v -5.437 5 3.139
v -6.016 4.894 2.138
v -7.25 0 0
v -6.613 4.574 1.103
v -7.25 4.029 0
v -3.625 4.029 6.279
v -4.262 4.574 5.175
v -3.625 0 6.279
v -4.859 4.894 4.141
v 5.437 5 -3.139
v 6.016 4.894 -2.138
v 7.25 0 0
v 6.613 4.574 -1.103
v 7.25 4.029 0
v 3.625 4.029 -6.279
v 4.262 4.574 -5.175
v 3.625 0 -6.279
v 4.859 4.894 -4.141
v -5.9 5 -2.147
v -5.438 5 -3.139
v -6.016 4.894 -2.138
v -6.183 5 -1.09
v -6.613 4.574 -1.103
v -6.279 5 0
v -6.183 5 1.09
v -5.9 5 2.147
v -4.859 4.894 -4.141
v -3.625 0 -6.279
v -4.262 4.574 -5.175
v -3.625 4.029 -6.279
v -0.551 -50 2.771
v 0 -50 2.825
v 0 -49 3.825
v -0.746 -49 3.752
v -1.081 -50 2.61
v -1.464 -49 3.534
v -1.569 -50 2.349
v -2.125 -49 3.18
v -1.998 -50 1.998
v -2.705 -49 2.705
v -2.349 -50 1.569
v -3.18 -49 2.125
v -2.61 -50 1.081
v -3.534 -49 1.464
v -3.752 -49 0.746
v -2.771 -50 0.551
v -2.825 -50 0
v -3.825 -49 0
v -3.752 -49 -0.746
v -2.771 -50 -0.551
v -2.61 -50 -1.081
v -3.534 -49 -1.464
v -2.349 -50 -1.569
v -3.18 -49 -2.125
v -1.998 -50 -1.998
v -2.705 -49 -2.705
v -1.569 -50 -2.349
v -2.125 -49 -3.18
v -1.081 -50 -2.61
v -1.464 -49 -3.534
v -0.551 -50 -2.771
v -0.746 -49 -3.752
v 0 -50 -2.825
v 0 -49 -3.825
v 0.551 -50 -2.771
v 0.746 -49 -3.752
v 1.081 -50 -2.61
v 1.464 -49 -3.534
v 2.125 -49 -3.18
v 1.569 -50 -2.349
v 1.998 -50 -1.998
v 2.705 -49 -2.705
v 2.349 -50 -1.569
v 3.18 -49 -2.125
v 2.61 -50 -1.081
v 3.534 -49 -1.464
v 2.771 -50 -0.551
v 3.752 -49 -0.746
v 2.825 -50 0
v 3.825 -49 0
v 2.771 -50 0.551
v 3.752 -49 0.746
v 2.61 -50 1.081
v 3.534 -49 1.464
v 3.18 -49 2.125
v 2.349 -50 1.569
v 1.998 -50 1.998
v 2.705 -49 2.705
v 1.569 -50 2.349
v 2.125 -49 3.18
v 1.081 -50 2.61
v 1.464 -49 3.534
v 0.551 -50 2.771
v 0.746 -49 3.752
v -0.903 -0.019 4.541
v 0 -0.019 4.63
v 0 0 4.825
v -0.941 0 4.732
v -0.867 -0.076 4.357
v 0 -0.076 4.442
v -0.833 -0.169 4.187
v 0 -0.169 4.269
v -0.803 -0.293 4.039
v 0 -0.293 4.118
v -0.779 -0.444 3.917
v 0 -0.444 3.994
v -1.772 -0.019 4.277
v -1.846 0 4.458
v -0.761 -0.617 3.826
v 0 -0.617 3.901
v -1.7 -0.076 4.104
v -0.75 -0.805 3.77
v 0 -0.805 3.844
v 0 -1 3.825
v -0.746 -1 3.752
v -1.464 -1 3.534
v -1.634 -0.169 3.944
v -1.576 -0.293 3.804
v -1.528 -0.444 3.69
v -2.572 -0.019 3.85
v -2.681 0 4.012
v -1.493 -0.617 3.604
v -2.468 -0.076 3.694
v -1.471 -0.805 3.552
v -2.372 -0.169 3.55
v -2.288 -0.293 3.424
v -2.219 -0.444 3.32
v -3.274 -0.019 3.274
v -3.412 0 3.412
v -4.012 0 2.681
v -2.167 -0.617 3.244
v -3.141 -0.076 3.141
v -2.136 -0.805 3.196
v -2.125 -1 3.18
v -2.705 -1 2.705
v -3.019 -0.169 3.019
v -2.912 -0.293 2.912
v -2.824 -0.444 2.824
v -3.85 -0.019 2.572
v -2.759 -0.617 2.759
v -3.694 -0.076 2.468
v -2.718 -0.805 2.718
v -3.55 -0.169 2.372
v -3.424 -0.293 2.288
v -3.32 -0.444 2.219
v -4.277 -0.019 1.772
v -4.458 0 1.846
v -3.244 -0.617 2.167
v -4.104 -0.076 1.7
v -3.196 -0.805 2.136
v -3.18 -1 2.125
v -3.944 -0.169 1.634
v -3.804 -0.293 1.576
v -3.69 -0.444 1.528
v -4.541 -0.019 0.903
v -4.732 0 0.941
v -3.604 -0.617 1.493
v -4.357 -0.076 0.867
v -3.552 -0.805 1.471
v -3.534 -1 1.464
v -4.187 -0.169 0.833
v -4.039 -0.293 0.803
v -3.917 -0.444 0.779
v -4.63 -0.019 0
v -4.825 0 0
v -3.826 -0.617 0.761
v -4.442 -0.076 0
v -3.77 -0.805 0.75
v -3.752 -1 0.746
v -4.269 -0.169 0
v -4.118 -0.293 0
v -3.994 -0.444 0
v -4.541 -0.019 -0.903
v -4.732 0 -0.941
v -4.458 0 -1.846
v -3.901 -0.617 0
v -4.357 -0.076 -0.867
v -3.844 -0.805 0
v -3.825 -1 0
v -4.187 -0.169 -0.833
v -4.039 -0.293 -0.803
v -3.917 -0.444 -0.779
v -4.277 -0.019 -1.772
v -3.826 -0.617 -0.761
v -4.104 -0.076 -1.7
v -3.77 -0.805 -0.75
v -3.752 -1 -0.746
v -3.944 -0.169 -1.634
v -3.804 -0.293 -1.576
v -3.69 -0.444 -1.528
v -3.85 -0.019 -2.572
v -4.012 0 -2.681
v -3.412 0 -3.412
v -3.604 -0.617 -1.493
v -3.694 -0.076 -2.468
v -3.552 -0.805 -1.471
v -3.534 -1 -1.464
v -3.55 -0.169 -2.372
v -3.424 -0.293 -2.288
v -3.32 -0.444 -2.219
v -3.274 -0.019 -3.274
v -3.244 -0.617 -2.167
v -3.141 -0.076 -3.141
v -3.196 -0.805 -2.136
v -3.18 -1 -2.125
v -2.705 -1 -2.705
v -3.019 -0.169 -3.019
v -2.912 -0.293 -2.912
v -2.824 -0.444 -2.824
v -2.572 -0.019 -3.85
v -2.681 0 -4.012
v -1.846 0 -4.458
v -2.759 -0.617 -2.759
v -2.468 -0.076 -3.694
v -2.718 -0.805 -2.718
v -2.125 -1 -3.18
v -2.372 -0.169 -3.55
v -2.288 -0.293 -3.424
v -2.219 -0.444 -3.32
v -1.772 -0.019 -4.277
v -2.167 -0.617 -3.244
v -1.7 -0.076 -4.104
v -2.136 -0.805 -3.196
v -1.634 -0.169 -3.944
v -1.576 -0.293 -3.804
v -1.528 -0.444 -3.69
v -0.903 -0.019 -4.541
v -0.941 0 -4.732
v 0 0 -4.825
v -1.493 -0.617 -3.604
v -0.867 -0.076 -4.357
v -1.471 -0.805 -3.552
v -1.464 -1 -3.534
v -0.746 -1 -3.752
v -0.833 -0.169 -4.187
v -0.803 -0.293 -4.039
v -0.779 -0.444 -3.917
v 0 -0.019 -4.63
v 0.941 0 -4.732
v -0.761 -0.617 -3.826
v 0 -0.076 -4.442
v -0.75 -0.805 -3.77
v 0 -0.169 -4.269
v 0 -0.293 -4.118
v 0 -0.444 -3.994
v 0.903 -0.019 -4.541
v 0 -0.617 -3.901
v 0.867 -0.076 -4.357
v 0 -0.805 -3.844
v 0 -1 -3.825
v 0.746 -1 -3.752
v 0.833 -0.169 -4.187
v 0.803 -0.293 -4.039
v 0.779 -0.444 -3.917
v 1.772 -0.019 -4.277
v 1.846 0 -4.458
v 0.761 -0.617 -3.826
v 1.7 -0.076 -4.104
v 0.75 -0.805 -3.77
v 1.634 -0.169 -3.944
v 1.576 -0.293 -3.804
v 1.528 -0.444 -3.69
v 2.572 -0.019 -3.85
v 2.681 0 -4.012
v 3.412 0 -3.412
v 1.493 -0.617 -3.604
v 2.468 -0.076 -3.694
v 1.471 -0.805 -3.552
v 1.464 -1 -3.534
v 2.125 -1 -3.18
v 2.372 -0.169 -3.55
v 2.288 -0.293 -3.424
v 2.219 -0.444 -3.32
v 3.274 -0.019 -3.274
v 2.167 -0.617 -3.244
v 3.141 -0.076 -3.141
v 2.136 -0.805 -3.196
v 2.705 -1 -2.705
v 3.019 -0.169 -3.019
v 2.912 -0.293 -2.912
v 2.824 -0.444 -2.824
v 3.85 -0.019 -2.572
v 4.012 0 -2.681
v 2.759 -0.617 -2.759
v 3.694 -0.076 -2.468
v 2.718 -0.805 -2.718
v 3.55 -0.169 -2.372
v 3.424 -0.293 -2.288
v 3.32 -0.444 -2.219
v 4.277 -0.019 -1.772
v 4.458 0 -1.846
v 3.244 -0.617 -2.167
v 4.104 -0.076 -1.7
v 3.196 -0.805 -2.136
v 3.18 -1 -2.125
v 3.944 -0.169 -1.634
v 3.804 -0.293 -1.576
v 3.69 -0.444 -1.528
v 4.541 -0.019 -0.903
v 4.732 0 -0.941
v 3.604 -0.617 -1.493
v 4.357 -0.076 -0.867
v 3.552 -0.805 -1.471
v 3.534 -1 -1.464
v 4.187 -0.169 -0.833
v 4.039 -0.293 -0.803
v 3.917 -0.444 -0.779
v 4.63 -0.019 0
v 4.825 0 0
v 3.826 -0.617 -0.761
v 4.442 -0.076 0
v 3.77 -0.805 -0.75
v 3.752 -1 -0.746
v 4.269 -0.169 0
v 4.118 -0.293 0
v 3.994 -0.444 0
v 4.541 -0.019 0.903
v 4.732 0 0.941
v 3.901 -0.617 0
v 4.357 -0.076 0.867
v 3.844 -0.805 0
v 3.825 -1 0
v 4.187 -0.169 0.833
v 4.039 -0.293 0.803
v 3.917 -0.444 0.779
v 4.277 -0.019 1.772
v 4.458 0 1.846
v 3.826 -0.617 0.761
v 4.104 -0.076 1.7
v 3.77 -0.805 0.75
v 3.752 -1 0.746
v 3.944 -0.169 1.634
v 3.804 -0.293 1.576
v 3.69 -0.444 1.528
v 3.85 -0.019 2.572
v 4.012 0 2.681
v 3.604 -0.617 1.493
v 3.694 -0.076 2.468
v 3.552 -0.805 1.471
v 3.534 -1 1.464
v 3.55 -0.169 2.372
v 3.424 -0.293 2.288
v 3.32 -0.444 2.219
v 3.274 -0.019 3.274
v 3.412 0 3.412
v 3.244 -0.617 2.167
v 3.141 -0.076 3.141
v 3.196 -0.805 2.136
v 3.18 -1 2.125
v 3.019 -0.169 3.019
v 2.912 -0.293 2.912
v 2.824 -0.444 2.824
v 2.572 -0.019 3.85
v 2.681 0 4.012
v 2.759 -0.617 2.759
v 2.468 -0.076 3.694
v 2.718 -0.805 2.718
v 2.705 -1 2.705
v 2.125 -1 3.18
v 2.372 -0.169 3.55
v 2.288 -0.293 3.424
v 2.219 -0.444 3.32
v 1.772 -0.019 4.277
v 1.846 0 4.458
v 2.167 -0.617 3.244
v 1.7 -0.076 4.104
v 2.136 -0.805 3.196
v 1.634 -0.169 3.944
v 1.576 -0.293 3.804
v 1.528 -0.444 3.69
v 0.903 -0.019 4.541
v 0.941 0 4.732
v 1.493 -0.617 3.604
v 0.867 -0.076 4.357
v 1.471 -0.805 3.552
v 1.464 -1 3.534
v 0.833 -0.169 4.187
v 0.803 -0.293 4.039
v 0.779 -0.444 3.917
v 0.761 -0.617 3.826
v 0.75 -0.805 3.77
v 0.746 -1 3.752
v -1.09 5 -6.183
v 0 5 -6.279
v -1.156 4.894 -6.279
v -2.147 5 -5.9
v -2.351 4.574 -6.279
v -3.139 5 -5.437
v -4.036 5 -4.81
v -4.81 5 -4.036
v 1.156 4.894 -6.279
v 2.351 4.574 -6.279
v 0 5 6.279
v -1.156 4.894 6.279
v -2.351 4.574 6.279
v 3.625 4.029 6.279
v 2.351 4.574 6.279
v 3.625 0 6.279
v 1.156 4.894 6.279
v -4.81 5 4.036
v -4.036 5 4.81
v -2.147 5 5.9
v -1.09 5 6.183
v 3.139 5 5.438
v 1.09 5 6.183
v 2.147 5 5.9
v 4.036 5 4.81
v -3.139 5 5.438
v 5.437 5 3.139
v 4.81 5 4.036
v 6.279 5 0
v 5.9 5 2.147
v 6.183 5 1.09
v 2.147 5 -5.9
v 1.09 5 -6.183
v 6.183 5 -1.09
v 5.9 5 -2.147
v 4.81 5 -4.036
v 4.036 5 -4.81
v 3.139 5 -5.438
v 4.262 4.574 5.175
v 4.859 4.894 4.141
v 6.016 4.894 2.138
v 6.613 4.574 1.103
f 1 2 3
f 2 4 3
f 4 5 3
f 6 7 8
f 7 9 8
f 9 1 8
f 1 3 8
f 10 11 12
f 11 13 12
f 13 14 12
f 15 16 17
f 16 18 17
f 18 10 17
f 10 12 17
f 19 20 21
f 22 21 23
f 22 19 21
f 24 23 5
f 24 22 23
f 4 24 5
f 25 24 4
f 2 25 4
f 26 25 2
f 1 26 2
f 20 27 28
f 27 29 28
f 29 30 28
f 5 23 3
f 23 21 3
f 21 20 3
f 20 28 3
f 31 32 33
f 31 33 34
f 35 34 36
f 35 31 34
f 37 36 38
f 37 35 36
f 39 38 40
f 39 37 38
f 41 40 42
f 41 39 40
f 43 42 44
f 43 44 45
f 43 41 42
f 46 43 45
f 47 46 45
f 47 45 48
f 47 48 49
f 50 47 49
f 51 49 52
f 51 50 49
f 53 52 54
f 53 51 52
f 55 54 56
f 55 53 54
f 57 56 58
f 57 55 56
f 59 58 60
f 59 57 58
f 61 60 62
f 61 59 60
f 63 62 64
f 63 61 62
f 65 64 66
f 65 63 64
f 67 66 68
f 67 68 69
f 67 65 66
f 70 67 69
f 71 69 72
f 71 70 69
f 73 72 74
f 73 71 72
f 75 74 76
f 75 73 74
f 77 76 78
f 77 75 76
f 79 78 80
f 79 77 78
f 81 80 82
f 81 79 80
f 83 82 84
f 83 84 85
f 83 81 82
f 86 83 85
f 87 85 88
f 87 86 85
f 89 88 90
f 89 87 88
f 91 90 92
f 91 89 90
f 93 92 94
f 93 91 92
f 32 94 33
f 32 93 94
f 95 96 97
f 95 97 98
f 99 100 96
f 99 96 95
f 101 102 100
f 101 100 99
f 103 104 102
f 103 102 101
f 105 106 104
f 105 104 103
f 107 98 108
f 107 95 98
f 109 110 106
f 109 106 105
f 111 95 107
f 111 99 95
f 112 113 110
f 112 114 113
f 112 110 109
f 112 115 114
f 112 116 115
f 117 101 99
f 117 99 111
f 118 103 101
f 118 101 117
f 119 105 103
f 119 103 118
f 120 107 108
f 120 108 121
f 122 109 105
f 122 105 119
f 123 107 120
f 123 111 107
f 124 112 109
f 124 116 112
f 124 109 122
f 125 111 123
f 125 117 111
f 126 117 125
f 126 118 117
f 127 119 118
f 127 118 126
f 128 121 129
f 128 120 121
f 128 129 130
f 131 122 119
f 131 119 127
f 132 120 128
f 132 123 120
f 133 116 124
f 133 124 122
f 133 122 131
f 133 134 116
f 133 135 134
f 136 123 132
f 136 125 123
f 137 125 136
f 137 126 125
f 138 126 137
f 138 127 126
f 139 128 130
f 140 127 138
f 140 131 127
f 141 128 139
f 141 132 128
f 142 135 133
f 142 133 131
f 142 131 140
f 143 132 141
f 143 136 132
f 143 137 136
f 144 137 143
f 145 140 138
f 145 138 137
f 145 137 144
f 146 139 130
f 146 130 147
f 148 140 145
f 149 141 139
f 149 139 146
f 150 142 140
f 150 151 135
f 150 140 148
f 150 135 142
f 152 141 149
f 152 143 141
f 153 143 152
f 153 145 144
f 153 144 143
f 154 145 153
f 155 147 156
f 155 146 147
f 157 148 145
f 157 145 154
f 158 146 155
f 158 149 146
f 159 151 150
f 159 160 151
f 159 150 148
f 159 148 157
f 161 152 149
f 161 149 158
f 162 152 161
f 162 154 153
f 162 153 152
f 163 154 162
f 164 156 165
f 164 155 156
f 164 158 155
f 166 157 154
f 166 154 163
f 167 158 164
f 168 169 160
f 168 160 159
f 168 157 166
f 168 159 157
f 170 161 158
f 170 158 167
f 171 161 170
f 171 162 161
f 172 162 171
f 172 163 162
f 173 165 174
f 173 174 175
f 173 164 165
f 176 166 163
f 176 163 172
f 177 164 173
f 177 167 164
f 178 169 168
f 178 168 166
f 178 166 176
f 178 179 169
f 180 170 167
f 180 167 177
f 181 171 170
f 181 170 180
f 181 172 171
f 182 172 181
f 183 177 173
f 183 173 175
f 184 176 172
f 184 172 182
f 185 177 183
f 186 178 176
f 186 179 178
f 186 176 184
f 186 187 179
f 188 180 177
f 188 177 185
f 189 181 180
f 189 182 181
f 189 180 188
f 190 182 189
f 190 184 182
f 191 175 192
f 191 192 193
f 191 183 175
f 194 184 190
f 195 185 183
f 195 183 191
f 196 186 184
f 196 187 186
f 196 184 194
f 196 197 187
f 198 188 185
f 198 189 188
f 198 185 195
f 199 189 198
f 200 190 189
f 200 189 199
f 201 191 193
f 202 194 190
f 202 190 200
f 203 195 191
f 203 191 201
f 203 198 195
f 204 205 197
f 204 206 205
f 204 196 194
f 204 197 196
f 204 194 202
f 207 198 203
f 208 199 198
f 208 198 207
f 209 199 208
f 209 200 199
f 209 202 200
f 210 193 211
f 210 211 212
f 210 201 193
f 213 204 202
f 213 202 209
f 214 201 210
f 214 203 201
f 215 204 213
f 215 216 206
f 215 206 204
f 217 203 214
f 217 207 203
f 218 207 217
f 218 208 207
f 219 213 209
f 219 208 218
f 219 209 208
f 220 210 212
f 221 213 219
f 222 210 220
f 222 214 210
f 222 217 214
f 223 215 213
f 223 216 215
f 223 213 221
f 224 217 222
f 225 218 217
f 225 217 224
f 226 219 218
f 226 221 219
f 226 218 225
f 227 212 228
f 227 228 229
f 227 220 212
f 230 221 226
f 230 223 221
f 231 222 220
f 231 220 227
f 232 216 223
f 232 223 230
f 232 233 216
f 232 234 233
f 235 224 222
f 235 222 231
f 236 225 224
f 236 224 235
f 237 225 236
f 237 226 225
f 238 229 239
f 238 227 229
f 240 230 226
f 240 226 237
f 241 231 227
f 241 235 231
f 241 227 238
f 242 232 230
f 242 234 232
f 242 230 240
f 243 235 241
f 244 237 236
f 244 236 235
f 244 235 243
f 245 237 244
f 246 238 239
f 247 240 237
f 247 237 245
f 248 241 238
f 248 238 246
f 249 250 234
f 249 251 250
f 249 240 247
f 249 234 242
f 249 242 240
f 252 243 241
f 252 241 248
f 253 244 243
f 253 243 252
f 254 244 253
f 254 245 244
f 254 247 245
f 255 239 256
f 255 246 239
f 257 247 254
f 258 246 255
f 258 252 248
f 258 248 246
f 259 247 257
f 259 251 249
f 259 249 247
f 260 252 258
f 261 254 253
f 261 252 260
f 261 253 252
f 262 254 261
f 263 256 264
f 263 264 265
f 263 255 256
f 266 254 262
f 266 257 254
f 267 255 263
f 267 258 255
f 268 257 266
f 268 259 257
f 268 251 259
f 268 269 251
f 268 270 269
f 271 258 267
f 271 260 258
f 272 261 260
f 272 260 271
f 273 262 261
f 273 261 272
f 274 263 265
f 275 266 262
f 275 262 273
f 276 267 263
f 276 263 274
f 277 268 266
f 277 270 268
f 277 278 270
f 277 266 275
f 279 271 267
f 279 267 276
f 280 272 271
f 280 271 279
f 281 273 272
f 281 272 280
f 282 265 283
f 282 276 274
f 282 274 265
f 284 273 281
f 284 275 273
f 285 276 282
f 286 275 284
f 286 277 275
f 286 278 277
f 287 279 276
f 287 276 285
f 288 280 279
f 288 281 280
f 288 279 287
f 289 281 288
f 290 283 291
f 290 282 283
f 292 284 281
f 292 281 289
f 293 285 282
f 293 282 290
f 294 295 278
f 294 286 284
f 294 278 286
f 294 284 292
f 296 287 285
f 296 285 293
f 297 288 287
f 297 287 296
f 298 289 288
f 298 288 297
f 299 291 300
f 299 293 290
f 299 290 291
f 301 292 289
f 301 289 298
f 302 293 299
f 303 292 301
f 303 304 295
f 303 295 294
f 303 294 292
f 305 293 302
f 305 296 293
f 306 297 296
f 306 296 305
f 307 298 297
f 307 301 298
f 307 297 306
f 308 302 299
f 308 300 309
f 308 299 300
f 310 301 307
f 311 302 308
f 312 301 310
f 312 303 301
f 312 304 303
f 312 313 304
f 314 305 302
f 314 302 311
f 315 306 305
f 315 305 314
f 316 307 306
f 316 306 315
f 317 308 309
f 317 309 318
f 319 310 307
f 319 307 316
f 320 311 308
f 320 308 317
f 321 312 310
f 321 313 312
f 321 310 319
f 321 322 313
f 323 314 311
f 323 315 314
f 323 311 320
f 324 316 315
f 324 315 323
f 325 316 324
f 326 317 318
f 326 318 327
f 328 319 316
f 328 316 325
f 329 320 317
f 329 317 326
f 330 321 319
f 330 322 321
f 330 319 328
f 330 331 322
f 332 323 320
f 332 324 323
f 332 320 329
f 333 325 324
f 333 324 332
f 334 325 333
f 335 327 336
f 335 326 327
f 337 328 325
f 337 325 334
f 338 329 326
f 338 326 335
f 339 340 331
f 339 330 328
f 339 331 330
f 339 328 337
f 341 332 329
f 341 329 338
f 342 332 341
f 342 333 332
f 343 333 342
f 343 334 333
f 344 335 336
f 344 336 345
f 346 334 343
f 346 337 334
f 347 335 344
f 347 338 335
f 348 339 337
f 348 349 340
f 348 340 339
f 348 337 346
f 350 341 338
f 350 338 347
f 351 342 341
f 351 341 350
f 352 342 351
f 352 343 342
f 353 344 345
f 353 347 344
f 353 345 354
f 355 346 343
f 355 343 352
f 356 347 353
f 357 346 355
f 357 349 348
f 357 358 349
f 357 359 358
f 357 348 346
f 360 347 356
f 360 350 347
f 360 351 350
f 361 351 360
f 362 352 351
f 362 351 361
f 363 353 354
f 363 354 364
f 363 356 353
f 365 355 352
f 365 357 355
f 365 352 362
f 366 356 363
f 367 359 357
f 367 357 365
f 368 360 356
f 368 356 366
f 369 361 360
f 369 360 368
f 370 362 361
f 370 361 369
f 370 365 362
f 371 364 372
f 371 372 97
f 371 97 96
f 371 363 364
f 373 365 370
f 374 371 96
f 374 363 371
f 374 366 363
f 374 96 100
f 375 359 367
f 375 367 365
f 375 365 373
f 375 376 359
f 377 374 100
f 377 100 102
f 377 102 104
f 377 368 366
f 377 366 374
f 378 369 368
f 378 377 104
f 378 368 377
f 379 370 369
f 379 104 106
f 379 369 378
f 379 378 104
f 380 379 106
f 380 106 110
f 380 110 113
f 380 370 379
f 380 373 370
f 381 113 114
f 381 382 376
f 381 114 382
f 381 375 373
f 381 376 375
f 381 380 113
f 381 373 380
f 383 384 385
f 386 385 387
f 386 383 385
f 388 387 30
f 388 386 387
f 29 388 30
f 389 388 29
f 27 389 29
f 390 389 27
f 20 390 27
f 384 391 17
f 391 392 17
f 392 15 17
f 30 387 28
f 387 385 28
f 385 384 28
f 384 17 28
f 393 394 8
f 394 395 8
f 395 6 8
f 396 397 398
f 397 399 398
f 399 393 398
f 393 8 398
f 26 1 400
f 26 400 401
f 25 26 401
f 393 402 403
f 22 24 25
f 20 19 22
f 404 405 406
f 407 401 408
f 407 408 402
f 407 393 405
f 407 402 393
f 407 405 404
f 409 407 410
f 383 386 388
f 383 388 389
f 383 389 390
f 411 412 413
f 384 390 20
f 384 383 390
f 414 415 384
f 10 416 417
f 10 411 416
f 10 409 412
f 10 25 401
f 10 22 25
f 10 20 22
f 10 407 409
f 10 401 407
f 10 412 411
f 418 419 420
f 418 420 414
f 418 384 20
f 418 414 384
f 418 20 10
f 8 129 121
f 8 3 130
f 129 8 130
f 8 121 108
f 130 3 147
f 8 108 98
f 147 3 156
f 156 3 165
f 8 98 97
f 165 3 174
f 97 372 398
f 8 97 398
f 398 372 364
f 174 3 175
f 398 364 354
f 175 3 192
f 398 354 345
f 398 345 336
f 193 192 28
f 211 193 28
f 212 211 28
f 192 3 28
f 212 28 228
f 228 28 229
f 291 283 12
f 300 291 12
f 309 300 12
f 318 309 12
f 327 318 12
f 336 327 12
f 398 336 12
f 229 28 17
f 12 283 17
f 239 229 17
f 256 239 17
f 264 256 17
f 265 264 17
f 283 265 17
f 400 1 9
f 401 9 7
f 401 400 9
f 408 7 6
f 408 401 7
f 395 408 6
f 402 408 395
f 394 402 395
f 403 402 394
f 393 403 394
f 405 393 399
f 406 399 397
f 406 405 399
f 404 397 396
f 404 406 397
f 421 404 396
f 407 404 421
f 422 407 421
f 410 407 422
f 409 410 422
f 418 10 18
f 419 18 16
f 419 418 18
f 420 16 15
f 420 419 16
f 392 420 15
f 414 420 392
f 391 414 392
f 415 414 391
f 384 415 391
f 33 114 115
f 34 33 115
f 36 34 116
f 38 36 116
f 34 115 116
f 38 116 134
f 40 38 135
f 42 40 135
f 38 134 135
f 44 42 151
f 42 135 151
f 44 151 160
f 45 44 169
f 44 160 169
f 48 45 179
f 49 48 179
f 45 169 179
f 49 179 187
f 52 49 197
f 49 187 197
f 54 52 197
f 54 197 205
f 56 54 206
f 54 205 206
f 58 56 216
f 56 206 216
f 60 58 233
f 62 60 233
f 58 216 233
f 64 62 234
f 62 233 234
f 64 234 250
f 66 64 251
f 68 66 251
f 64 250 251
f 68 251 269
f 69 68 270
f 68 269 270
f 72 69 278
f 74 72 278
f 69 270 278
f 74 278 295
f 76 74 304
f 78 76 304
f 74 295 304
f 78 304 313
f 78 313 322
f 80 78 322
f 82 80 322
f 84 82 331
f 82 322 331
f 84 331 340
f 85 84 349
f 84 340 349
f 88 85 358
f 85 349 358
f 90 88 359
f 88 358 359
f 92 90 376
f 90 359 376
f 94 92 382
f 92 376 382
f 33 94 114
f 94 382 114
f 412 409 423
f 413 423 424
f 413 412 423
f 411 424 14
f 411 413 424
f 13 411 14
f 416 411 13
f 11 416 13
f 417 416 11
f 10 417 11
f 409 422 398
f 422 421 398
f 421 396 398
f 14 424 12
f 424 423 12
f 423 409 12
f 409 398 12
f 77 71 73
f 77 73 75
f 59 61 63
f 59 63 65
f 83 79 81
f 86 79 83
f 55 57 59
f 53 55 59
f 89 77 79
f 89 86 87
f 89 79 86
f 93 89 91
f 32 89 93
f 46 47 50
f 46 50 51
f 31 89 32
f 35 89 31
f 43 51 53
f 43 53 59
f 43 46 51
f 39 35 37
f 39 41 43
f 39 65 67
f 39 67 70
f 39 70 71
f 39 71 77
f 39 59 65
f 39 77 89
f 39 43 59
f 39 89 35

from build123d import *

# Parameters (mm, degrees)
EXTRUDE_1_DEPTH     = 5
SKETCH_8_OUTSIDE_W  = 22.464
SKETCH_8_OUTSIDE_H  = 20.522
SKETCH_8_OUTSIDE_R  = 6.278684177
CUT_EXTRUDE_1_DEPTH = 1
CUT_EXTRUDE_1_DRAFT = -45
SKETCH_9_R          = 3.825
BOLT_LENGTH_DEPTH   = 50
FILLET_1_R          = 1
CHAMFER_1_SIZE      = 1


with BuildPart() as part:
    # Эскиз6 → Бобышка-Вытянуть1 (new body)
    with BuildSketch(Plane(origin=(0, 0, 0), x_dir=(1, 0, 0), z_dir=(0, 1, 0))):
        Polygon((7.25, 0), (3.625, 6.278684177), (-3.625, 6.278684177), (-7.25, 0), (-3.625, -6.278684177), (3.625, -6.278684177), align=None)
    extrude(amount=EXTRUDE_1_DEPTH)


with BuildPart() as cut_extrude_1_tool:
    # Эскиз8 outside → Вырез-Вытянуть1 (with draft: the straight prism first)
    with BuildSketch(Plane(origin=(0, 5, 0), x_dir=(1, 0, 0), z_dir=(0, 1, 0))):
        Rectangle(SKETCH_8_OUTSIDE_W, SKETCH_8_OUTSIDE_H)
        Circle(SKETCH_8_OUTSIDE_R, mode=Mode.SUBTRACT)
    extrude(amount=-CUT_EXTRUDE_1_DEPTH)
    # Вырез-Вытянуть1: the draft: its side faces are tilted about the plane it starts from
    cut_extrude_1_sides = [cut_extrude_1_tool.faces().sort_by_distance(p)[0] for p in [
        (0, 4.5, 10.261),
        (11.232, 4.5, 0),
        (0, 4.5, -10.261),
        (-11.232, 4.5, 0),
        (-6.278684177, 4.5, 0),
    ]]
    draft(cut_extrude_1_sides, Plane(origin=(0, 5, 0), x_dir=(1, 0, 0), z_dir=(0, 1, 0)), CUT_EXTRUDE_1_DRAFT)


with BuildPart() as part_1:
    add(part.part)

    # Вырез-Вытянуть1: cut by cut_extrude_1_tool
    add(cut_extrude_1_tool.part, mode=Mode.SUBTRACT)

    # Эскиз9 → bolt length (add)
    with BuildSketch(Plane.XZ):
        with Locations(Location((0, 0, 0), (0, 0, 90))):  # turned: the seam where the file's is
            Circle(SKETCH_9_R)
    extrude(amount=BOLT_LENGTH_DEPTH)

    # Скругление1
    fillet_1_edges = [part_1.edges().sort_by_distance(p)[0] for p in [
        (0, 0, -3.825),
    ]]
    fillet(fillet_1_edges, radius=FILLET_1_R)

    # Фаска1
    chamfer_1_edges = [part_1.edges().sort_by_distance(p)[0] for p in [
        (0, -50, -3.825),
    ]]
    chamfer(chamfer_1_edges, length=CHAMFER_1_SIZE)


solid = part_1.part
